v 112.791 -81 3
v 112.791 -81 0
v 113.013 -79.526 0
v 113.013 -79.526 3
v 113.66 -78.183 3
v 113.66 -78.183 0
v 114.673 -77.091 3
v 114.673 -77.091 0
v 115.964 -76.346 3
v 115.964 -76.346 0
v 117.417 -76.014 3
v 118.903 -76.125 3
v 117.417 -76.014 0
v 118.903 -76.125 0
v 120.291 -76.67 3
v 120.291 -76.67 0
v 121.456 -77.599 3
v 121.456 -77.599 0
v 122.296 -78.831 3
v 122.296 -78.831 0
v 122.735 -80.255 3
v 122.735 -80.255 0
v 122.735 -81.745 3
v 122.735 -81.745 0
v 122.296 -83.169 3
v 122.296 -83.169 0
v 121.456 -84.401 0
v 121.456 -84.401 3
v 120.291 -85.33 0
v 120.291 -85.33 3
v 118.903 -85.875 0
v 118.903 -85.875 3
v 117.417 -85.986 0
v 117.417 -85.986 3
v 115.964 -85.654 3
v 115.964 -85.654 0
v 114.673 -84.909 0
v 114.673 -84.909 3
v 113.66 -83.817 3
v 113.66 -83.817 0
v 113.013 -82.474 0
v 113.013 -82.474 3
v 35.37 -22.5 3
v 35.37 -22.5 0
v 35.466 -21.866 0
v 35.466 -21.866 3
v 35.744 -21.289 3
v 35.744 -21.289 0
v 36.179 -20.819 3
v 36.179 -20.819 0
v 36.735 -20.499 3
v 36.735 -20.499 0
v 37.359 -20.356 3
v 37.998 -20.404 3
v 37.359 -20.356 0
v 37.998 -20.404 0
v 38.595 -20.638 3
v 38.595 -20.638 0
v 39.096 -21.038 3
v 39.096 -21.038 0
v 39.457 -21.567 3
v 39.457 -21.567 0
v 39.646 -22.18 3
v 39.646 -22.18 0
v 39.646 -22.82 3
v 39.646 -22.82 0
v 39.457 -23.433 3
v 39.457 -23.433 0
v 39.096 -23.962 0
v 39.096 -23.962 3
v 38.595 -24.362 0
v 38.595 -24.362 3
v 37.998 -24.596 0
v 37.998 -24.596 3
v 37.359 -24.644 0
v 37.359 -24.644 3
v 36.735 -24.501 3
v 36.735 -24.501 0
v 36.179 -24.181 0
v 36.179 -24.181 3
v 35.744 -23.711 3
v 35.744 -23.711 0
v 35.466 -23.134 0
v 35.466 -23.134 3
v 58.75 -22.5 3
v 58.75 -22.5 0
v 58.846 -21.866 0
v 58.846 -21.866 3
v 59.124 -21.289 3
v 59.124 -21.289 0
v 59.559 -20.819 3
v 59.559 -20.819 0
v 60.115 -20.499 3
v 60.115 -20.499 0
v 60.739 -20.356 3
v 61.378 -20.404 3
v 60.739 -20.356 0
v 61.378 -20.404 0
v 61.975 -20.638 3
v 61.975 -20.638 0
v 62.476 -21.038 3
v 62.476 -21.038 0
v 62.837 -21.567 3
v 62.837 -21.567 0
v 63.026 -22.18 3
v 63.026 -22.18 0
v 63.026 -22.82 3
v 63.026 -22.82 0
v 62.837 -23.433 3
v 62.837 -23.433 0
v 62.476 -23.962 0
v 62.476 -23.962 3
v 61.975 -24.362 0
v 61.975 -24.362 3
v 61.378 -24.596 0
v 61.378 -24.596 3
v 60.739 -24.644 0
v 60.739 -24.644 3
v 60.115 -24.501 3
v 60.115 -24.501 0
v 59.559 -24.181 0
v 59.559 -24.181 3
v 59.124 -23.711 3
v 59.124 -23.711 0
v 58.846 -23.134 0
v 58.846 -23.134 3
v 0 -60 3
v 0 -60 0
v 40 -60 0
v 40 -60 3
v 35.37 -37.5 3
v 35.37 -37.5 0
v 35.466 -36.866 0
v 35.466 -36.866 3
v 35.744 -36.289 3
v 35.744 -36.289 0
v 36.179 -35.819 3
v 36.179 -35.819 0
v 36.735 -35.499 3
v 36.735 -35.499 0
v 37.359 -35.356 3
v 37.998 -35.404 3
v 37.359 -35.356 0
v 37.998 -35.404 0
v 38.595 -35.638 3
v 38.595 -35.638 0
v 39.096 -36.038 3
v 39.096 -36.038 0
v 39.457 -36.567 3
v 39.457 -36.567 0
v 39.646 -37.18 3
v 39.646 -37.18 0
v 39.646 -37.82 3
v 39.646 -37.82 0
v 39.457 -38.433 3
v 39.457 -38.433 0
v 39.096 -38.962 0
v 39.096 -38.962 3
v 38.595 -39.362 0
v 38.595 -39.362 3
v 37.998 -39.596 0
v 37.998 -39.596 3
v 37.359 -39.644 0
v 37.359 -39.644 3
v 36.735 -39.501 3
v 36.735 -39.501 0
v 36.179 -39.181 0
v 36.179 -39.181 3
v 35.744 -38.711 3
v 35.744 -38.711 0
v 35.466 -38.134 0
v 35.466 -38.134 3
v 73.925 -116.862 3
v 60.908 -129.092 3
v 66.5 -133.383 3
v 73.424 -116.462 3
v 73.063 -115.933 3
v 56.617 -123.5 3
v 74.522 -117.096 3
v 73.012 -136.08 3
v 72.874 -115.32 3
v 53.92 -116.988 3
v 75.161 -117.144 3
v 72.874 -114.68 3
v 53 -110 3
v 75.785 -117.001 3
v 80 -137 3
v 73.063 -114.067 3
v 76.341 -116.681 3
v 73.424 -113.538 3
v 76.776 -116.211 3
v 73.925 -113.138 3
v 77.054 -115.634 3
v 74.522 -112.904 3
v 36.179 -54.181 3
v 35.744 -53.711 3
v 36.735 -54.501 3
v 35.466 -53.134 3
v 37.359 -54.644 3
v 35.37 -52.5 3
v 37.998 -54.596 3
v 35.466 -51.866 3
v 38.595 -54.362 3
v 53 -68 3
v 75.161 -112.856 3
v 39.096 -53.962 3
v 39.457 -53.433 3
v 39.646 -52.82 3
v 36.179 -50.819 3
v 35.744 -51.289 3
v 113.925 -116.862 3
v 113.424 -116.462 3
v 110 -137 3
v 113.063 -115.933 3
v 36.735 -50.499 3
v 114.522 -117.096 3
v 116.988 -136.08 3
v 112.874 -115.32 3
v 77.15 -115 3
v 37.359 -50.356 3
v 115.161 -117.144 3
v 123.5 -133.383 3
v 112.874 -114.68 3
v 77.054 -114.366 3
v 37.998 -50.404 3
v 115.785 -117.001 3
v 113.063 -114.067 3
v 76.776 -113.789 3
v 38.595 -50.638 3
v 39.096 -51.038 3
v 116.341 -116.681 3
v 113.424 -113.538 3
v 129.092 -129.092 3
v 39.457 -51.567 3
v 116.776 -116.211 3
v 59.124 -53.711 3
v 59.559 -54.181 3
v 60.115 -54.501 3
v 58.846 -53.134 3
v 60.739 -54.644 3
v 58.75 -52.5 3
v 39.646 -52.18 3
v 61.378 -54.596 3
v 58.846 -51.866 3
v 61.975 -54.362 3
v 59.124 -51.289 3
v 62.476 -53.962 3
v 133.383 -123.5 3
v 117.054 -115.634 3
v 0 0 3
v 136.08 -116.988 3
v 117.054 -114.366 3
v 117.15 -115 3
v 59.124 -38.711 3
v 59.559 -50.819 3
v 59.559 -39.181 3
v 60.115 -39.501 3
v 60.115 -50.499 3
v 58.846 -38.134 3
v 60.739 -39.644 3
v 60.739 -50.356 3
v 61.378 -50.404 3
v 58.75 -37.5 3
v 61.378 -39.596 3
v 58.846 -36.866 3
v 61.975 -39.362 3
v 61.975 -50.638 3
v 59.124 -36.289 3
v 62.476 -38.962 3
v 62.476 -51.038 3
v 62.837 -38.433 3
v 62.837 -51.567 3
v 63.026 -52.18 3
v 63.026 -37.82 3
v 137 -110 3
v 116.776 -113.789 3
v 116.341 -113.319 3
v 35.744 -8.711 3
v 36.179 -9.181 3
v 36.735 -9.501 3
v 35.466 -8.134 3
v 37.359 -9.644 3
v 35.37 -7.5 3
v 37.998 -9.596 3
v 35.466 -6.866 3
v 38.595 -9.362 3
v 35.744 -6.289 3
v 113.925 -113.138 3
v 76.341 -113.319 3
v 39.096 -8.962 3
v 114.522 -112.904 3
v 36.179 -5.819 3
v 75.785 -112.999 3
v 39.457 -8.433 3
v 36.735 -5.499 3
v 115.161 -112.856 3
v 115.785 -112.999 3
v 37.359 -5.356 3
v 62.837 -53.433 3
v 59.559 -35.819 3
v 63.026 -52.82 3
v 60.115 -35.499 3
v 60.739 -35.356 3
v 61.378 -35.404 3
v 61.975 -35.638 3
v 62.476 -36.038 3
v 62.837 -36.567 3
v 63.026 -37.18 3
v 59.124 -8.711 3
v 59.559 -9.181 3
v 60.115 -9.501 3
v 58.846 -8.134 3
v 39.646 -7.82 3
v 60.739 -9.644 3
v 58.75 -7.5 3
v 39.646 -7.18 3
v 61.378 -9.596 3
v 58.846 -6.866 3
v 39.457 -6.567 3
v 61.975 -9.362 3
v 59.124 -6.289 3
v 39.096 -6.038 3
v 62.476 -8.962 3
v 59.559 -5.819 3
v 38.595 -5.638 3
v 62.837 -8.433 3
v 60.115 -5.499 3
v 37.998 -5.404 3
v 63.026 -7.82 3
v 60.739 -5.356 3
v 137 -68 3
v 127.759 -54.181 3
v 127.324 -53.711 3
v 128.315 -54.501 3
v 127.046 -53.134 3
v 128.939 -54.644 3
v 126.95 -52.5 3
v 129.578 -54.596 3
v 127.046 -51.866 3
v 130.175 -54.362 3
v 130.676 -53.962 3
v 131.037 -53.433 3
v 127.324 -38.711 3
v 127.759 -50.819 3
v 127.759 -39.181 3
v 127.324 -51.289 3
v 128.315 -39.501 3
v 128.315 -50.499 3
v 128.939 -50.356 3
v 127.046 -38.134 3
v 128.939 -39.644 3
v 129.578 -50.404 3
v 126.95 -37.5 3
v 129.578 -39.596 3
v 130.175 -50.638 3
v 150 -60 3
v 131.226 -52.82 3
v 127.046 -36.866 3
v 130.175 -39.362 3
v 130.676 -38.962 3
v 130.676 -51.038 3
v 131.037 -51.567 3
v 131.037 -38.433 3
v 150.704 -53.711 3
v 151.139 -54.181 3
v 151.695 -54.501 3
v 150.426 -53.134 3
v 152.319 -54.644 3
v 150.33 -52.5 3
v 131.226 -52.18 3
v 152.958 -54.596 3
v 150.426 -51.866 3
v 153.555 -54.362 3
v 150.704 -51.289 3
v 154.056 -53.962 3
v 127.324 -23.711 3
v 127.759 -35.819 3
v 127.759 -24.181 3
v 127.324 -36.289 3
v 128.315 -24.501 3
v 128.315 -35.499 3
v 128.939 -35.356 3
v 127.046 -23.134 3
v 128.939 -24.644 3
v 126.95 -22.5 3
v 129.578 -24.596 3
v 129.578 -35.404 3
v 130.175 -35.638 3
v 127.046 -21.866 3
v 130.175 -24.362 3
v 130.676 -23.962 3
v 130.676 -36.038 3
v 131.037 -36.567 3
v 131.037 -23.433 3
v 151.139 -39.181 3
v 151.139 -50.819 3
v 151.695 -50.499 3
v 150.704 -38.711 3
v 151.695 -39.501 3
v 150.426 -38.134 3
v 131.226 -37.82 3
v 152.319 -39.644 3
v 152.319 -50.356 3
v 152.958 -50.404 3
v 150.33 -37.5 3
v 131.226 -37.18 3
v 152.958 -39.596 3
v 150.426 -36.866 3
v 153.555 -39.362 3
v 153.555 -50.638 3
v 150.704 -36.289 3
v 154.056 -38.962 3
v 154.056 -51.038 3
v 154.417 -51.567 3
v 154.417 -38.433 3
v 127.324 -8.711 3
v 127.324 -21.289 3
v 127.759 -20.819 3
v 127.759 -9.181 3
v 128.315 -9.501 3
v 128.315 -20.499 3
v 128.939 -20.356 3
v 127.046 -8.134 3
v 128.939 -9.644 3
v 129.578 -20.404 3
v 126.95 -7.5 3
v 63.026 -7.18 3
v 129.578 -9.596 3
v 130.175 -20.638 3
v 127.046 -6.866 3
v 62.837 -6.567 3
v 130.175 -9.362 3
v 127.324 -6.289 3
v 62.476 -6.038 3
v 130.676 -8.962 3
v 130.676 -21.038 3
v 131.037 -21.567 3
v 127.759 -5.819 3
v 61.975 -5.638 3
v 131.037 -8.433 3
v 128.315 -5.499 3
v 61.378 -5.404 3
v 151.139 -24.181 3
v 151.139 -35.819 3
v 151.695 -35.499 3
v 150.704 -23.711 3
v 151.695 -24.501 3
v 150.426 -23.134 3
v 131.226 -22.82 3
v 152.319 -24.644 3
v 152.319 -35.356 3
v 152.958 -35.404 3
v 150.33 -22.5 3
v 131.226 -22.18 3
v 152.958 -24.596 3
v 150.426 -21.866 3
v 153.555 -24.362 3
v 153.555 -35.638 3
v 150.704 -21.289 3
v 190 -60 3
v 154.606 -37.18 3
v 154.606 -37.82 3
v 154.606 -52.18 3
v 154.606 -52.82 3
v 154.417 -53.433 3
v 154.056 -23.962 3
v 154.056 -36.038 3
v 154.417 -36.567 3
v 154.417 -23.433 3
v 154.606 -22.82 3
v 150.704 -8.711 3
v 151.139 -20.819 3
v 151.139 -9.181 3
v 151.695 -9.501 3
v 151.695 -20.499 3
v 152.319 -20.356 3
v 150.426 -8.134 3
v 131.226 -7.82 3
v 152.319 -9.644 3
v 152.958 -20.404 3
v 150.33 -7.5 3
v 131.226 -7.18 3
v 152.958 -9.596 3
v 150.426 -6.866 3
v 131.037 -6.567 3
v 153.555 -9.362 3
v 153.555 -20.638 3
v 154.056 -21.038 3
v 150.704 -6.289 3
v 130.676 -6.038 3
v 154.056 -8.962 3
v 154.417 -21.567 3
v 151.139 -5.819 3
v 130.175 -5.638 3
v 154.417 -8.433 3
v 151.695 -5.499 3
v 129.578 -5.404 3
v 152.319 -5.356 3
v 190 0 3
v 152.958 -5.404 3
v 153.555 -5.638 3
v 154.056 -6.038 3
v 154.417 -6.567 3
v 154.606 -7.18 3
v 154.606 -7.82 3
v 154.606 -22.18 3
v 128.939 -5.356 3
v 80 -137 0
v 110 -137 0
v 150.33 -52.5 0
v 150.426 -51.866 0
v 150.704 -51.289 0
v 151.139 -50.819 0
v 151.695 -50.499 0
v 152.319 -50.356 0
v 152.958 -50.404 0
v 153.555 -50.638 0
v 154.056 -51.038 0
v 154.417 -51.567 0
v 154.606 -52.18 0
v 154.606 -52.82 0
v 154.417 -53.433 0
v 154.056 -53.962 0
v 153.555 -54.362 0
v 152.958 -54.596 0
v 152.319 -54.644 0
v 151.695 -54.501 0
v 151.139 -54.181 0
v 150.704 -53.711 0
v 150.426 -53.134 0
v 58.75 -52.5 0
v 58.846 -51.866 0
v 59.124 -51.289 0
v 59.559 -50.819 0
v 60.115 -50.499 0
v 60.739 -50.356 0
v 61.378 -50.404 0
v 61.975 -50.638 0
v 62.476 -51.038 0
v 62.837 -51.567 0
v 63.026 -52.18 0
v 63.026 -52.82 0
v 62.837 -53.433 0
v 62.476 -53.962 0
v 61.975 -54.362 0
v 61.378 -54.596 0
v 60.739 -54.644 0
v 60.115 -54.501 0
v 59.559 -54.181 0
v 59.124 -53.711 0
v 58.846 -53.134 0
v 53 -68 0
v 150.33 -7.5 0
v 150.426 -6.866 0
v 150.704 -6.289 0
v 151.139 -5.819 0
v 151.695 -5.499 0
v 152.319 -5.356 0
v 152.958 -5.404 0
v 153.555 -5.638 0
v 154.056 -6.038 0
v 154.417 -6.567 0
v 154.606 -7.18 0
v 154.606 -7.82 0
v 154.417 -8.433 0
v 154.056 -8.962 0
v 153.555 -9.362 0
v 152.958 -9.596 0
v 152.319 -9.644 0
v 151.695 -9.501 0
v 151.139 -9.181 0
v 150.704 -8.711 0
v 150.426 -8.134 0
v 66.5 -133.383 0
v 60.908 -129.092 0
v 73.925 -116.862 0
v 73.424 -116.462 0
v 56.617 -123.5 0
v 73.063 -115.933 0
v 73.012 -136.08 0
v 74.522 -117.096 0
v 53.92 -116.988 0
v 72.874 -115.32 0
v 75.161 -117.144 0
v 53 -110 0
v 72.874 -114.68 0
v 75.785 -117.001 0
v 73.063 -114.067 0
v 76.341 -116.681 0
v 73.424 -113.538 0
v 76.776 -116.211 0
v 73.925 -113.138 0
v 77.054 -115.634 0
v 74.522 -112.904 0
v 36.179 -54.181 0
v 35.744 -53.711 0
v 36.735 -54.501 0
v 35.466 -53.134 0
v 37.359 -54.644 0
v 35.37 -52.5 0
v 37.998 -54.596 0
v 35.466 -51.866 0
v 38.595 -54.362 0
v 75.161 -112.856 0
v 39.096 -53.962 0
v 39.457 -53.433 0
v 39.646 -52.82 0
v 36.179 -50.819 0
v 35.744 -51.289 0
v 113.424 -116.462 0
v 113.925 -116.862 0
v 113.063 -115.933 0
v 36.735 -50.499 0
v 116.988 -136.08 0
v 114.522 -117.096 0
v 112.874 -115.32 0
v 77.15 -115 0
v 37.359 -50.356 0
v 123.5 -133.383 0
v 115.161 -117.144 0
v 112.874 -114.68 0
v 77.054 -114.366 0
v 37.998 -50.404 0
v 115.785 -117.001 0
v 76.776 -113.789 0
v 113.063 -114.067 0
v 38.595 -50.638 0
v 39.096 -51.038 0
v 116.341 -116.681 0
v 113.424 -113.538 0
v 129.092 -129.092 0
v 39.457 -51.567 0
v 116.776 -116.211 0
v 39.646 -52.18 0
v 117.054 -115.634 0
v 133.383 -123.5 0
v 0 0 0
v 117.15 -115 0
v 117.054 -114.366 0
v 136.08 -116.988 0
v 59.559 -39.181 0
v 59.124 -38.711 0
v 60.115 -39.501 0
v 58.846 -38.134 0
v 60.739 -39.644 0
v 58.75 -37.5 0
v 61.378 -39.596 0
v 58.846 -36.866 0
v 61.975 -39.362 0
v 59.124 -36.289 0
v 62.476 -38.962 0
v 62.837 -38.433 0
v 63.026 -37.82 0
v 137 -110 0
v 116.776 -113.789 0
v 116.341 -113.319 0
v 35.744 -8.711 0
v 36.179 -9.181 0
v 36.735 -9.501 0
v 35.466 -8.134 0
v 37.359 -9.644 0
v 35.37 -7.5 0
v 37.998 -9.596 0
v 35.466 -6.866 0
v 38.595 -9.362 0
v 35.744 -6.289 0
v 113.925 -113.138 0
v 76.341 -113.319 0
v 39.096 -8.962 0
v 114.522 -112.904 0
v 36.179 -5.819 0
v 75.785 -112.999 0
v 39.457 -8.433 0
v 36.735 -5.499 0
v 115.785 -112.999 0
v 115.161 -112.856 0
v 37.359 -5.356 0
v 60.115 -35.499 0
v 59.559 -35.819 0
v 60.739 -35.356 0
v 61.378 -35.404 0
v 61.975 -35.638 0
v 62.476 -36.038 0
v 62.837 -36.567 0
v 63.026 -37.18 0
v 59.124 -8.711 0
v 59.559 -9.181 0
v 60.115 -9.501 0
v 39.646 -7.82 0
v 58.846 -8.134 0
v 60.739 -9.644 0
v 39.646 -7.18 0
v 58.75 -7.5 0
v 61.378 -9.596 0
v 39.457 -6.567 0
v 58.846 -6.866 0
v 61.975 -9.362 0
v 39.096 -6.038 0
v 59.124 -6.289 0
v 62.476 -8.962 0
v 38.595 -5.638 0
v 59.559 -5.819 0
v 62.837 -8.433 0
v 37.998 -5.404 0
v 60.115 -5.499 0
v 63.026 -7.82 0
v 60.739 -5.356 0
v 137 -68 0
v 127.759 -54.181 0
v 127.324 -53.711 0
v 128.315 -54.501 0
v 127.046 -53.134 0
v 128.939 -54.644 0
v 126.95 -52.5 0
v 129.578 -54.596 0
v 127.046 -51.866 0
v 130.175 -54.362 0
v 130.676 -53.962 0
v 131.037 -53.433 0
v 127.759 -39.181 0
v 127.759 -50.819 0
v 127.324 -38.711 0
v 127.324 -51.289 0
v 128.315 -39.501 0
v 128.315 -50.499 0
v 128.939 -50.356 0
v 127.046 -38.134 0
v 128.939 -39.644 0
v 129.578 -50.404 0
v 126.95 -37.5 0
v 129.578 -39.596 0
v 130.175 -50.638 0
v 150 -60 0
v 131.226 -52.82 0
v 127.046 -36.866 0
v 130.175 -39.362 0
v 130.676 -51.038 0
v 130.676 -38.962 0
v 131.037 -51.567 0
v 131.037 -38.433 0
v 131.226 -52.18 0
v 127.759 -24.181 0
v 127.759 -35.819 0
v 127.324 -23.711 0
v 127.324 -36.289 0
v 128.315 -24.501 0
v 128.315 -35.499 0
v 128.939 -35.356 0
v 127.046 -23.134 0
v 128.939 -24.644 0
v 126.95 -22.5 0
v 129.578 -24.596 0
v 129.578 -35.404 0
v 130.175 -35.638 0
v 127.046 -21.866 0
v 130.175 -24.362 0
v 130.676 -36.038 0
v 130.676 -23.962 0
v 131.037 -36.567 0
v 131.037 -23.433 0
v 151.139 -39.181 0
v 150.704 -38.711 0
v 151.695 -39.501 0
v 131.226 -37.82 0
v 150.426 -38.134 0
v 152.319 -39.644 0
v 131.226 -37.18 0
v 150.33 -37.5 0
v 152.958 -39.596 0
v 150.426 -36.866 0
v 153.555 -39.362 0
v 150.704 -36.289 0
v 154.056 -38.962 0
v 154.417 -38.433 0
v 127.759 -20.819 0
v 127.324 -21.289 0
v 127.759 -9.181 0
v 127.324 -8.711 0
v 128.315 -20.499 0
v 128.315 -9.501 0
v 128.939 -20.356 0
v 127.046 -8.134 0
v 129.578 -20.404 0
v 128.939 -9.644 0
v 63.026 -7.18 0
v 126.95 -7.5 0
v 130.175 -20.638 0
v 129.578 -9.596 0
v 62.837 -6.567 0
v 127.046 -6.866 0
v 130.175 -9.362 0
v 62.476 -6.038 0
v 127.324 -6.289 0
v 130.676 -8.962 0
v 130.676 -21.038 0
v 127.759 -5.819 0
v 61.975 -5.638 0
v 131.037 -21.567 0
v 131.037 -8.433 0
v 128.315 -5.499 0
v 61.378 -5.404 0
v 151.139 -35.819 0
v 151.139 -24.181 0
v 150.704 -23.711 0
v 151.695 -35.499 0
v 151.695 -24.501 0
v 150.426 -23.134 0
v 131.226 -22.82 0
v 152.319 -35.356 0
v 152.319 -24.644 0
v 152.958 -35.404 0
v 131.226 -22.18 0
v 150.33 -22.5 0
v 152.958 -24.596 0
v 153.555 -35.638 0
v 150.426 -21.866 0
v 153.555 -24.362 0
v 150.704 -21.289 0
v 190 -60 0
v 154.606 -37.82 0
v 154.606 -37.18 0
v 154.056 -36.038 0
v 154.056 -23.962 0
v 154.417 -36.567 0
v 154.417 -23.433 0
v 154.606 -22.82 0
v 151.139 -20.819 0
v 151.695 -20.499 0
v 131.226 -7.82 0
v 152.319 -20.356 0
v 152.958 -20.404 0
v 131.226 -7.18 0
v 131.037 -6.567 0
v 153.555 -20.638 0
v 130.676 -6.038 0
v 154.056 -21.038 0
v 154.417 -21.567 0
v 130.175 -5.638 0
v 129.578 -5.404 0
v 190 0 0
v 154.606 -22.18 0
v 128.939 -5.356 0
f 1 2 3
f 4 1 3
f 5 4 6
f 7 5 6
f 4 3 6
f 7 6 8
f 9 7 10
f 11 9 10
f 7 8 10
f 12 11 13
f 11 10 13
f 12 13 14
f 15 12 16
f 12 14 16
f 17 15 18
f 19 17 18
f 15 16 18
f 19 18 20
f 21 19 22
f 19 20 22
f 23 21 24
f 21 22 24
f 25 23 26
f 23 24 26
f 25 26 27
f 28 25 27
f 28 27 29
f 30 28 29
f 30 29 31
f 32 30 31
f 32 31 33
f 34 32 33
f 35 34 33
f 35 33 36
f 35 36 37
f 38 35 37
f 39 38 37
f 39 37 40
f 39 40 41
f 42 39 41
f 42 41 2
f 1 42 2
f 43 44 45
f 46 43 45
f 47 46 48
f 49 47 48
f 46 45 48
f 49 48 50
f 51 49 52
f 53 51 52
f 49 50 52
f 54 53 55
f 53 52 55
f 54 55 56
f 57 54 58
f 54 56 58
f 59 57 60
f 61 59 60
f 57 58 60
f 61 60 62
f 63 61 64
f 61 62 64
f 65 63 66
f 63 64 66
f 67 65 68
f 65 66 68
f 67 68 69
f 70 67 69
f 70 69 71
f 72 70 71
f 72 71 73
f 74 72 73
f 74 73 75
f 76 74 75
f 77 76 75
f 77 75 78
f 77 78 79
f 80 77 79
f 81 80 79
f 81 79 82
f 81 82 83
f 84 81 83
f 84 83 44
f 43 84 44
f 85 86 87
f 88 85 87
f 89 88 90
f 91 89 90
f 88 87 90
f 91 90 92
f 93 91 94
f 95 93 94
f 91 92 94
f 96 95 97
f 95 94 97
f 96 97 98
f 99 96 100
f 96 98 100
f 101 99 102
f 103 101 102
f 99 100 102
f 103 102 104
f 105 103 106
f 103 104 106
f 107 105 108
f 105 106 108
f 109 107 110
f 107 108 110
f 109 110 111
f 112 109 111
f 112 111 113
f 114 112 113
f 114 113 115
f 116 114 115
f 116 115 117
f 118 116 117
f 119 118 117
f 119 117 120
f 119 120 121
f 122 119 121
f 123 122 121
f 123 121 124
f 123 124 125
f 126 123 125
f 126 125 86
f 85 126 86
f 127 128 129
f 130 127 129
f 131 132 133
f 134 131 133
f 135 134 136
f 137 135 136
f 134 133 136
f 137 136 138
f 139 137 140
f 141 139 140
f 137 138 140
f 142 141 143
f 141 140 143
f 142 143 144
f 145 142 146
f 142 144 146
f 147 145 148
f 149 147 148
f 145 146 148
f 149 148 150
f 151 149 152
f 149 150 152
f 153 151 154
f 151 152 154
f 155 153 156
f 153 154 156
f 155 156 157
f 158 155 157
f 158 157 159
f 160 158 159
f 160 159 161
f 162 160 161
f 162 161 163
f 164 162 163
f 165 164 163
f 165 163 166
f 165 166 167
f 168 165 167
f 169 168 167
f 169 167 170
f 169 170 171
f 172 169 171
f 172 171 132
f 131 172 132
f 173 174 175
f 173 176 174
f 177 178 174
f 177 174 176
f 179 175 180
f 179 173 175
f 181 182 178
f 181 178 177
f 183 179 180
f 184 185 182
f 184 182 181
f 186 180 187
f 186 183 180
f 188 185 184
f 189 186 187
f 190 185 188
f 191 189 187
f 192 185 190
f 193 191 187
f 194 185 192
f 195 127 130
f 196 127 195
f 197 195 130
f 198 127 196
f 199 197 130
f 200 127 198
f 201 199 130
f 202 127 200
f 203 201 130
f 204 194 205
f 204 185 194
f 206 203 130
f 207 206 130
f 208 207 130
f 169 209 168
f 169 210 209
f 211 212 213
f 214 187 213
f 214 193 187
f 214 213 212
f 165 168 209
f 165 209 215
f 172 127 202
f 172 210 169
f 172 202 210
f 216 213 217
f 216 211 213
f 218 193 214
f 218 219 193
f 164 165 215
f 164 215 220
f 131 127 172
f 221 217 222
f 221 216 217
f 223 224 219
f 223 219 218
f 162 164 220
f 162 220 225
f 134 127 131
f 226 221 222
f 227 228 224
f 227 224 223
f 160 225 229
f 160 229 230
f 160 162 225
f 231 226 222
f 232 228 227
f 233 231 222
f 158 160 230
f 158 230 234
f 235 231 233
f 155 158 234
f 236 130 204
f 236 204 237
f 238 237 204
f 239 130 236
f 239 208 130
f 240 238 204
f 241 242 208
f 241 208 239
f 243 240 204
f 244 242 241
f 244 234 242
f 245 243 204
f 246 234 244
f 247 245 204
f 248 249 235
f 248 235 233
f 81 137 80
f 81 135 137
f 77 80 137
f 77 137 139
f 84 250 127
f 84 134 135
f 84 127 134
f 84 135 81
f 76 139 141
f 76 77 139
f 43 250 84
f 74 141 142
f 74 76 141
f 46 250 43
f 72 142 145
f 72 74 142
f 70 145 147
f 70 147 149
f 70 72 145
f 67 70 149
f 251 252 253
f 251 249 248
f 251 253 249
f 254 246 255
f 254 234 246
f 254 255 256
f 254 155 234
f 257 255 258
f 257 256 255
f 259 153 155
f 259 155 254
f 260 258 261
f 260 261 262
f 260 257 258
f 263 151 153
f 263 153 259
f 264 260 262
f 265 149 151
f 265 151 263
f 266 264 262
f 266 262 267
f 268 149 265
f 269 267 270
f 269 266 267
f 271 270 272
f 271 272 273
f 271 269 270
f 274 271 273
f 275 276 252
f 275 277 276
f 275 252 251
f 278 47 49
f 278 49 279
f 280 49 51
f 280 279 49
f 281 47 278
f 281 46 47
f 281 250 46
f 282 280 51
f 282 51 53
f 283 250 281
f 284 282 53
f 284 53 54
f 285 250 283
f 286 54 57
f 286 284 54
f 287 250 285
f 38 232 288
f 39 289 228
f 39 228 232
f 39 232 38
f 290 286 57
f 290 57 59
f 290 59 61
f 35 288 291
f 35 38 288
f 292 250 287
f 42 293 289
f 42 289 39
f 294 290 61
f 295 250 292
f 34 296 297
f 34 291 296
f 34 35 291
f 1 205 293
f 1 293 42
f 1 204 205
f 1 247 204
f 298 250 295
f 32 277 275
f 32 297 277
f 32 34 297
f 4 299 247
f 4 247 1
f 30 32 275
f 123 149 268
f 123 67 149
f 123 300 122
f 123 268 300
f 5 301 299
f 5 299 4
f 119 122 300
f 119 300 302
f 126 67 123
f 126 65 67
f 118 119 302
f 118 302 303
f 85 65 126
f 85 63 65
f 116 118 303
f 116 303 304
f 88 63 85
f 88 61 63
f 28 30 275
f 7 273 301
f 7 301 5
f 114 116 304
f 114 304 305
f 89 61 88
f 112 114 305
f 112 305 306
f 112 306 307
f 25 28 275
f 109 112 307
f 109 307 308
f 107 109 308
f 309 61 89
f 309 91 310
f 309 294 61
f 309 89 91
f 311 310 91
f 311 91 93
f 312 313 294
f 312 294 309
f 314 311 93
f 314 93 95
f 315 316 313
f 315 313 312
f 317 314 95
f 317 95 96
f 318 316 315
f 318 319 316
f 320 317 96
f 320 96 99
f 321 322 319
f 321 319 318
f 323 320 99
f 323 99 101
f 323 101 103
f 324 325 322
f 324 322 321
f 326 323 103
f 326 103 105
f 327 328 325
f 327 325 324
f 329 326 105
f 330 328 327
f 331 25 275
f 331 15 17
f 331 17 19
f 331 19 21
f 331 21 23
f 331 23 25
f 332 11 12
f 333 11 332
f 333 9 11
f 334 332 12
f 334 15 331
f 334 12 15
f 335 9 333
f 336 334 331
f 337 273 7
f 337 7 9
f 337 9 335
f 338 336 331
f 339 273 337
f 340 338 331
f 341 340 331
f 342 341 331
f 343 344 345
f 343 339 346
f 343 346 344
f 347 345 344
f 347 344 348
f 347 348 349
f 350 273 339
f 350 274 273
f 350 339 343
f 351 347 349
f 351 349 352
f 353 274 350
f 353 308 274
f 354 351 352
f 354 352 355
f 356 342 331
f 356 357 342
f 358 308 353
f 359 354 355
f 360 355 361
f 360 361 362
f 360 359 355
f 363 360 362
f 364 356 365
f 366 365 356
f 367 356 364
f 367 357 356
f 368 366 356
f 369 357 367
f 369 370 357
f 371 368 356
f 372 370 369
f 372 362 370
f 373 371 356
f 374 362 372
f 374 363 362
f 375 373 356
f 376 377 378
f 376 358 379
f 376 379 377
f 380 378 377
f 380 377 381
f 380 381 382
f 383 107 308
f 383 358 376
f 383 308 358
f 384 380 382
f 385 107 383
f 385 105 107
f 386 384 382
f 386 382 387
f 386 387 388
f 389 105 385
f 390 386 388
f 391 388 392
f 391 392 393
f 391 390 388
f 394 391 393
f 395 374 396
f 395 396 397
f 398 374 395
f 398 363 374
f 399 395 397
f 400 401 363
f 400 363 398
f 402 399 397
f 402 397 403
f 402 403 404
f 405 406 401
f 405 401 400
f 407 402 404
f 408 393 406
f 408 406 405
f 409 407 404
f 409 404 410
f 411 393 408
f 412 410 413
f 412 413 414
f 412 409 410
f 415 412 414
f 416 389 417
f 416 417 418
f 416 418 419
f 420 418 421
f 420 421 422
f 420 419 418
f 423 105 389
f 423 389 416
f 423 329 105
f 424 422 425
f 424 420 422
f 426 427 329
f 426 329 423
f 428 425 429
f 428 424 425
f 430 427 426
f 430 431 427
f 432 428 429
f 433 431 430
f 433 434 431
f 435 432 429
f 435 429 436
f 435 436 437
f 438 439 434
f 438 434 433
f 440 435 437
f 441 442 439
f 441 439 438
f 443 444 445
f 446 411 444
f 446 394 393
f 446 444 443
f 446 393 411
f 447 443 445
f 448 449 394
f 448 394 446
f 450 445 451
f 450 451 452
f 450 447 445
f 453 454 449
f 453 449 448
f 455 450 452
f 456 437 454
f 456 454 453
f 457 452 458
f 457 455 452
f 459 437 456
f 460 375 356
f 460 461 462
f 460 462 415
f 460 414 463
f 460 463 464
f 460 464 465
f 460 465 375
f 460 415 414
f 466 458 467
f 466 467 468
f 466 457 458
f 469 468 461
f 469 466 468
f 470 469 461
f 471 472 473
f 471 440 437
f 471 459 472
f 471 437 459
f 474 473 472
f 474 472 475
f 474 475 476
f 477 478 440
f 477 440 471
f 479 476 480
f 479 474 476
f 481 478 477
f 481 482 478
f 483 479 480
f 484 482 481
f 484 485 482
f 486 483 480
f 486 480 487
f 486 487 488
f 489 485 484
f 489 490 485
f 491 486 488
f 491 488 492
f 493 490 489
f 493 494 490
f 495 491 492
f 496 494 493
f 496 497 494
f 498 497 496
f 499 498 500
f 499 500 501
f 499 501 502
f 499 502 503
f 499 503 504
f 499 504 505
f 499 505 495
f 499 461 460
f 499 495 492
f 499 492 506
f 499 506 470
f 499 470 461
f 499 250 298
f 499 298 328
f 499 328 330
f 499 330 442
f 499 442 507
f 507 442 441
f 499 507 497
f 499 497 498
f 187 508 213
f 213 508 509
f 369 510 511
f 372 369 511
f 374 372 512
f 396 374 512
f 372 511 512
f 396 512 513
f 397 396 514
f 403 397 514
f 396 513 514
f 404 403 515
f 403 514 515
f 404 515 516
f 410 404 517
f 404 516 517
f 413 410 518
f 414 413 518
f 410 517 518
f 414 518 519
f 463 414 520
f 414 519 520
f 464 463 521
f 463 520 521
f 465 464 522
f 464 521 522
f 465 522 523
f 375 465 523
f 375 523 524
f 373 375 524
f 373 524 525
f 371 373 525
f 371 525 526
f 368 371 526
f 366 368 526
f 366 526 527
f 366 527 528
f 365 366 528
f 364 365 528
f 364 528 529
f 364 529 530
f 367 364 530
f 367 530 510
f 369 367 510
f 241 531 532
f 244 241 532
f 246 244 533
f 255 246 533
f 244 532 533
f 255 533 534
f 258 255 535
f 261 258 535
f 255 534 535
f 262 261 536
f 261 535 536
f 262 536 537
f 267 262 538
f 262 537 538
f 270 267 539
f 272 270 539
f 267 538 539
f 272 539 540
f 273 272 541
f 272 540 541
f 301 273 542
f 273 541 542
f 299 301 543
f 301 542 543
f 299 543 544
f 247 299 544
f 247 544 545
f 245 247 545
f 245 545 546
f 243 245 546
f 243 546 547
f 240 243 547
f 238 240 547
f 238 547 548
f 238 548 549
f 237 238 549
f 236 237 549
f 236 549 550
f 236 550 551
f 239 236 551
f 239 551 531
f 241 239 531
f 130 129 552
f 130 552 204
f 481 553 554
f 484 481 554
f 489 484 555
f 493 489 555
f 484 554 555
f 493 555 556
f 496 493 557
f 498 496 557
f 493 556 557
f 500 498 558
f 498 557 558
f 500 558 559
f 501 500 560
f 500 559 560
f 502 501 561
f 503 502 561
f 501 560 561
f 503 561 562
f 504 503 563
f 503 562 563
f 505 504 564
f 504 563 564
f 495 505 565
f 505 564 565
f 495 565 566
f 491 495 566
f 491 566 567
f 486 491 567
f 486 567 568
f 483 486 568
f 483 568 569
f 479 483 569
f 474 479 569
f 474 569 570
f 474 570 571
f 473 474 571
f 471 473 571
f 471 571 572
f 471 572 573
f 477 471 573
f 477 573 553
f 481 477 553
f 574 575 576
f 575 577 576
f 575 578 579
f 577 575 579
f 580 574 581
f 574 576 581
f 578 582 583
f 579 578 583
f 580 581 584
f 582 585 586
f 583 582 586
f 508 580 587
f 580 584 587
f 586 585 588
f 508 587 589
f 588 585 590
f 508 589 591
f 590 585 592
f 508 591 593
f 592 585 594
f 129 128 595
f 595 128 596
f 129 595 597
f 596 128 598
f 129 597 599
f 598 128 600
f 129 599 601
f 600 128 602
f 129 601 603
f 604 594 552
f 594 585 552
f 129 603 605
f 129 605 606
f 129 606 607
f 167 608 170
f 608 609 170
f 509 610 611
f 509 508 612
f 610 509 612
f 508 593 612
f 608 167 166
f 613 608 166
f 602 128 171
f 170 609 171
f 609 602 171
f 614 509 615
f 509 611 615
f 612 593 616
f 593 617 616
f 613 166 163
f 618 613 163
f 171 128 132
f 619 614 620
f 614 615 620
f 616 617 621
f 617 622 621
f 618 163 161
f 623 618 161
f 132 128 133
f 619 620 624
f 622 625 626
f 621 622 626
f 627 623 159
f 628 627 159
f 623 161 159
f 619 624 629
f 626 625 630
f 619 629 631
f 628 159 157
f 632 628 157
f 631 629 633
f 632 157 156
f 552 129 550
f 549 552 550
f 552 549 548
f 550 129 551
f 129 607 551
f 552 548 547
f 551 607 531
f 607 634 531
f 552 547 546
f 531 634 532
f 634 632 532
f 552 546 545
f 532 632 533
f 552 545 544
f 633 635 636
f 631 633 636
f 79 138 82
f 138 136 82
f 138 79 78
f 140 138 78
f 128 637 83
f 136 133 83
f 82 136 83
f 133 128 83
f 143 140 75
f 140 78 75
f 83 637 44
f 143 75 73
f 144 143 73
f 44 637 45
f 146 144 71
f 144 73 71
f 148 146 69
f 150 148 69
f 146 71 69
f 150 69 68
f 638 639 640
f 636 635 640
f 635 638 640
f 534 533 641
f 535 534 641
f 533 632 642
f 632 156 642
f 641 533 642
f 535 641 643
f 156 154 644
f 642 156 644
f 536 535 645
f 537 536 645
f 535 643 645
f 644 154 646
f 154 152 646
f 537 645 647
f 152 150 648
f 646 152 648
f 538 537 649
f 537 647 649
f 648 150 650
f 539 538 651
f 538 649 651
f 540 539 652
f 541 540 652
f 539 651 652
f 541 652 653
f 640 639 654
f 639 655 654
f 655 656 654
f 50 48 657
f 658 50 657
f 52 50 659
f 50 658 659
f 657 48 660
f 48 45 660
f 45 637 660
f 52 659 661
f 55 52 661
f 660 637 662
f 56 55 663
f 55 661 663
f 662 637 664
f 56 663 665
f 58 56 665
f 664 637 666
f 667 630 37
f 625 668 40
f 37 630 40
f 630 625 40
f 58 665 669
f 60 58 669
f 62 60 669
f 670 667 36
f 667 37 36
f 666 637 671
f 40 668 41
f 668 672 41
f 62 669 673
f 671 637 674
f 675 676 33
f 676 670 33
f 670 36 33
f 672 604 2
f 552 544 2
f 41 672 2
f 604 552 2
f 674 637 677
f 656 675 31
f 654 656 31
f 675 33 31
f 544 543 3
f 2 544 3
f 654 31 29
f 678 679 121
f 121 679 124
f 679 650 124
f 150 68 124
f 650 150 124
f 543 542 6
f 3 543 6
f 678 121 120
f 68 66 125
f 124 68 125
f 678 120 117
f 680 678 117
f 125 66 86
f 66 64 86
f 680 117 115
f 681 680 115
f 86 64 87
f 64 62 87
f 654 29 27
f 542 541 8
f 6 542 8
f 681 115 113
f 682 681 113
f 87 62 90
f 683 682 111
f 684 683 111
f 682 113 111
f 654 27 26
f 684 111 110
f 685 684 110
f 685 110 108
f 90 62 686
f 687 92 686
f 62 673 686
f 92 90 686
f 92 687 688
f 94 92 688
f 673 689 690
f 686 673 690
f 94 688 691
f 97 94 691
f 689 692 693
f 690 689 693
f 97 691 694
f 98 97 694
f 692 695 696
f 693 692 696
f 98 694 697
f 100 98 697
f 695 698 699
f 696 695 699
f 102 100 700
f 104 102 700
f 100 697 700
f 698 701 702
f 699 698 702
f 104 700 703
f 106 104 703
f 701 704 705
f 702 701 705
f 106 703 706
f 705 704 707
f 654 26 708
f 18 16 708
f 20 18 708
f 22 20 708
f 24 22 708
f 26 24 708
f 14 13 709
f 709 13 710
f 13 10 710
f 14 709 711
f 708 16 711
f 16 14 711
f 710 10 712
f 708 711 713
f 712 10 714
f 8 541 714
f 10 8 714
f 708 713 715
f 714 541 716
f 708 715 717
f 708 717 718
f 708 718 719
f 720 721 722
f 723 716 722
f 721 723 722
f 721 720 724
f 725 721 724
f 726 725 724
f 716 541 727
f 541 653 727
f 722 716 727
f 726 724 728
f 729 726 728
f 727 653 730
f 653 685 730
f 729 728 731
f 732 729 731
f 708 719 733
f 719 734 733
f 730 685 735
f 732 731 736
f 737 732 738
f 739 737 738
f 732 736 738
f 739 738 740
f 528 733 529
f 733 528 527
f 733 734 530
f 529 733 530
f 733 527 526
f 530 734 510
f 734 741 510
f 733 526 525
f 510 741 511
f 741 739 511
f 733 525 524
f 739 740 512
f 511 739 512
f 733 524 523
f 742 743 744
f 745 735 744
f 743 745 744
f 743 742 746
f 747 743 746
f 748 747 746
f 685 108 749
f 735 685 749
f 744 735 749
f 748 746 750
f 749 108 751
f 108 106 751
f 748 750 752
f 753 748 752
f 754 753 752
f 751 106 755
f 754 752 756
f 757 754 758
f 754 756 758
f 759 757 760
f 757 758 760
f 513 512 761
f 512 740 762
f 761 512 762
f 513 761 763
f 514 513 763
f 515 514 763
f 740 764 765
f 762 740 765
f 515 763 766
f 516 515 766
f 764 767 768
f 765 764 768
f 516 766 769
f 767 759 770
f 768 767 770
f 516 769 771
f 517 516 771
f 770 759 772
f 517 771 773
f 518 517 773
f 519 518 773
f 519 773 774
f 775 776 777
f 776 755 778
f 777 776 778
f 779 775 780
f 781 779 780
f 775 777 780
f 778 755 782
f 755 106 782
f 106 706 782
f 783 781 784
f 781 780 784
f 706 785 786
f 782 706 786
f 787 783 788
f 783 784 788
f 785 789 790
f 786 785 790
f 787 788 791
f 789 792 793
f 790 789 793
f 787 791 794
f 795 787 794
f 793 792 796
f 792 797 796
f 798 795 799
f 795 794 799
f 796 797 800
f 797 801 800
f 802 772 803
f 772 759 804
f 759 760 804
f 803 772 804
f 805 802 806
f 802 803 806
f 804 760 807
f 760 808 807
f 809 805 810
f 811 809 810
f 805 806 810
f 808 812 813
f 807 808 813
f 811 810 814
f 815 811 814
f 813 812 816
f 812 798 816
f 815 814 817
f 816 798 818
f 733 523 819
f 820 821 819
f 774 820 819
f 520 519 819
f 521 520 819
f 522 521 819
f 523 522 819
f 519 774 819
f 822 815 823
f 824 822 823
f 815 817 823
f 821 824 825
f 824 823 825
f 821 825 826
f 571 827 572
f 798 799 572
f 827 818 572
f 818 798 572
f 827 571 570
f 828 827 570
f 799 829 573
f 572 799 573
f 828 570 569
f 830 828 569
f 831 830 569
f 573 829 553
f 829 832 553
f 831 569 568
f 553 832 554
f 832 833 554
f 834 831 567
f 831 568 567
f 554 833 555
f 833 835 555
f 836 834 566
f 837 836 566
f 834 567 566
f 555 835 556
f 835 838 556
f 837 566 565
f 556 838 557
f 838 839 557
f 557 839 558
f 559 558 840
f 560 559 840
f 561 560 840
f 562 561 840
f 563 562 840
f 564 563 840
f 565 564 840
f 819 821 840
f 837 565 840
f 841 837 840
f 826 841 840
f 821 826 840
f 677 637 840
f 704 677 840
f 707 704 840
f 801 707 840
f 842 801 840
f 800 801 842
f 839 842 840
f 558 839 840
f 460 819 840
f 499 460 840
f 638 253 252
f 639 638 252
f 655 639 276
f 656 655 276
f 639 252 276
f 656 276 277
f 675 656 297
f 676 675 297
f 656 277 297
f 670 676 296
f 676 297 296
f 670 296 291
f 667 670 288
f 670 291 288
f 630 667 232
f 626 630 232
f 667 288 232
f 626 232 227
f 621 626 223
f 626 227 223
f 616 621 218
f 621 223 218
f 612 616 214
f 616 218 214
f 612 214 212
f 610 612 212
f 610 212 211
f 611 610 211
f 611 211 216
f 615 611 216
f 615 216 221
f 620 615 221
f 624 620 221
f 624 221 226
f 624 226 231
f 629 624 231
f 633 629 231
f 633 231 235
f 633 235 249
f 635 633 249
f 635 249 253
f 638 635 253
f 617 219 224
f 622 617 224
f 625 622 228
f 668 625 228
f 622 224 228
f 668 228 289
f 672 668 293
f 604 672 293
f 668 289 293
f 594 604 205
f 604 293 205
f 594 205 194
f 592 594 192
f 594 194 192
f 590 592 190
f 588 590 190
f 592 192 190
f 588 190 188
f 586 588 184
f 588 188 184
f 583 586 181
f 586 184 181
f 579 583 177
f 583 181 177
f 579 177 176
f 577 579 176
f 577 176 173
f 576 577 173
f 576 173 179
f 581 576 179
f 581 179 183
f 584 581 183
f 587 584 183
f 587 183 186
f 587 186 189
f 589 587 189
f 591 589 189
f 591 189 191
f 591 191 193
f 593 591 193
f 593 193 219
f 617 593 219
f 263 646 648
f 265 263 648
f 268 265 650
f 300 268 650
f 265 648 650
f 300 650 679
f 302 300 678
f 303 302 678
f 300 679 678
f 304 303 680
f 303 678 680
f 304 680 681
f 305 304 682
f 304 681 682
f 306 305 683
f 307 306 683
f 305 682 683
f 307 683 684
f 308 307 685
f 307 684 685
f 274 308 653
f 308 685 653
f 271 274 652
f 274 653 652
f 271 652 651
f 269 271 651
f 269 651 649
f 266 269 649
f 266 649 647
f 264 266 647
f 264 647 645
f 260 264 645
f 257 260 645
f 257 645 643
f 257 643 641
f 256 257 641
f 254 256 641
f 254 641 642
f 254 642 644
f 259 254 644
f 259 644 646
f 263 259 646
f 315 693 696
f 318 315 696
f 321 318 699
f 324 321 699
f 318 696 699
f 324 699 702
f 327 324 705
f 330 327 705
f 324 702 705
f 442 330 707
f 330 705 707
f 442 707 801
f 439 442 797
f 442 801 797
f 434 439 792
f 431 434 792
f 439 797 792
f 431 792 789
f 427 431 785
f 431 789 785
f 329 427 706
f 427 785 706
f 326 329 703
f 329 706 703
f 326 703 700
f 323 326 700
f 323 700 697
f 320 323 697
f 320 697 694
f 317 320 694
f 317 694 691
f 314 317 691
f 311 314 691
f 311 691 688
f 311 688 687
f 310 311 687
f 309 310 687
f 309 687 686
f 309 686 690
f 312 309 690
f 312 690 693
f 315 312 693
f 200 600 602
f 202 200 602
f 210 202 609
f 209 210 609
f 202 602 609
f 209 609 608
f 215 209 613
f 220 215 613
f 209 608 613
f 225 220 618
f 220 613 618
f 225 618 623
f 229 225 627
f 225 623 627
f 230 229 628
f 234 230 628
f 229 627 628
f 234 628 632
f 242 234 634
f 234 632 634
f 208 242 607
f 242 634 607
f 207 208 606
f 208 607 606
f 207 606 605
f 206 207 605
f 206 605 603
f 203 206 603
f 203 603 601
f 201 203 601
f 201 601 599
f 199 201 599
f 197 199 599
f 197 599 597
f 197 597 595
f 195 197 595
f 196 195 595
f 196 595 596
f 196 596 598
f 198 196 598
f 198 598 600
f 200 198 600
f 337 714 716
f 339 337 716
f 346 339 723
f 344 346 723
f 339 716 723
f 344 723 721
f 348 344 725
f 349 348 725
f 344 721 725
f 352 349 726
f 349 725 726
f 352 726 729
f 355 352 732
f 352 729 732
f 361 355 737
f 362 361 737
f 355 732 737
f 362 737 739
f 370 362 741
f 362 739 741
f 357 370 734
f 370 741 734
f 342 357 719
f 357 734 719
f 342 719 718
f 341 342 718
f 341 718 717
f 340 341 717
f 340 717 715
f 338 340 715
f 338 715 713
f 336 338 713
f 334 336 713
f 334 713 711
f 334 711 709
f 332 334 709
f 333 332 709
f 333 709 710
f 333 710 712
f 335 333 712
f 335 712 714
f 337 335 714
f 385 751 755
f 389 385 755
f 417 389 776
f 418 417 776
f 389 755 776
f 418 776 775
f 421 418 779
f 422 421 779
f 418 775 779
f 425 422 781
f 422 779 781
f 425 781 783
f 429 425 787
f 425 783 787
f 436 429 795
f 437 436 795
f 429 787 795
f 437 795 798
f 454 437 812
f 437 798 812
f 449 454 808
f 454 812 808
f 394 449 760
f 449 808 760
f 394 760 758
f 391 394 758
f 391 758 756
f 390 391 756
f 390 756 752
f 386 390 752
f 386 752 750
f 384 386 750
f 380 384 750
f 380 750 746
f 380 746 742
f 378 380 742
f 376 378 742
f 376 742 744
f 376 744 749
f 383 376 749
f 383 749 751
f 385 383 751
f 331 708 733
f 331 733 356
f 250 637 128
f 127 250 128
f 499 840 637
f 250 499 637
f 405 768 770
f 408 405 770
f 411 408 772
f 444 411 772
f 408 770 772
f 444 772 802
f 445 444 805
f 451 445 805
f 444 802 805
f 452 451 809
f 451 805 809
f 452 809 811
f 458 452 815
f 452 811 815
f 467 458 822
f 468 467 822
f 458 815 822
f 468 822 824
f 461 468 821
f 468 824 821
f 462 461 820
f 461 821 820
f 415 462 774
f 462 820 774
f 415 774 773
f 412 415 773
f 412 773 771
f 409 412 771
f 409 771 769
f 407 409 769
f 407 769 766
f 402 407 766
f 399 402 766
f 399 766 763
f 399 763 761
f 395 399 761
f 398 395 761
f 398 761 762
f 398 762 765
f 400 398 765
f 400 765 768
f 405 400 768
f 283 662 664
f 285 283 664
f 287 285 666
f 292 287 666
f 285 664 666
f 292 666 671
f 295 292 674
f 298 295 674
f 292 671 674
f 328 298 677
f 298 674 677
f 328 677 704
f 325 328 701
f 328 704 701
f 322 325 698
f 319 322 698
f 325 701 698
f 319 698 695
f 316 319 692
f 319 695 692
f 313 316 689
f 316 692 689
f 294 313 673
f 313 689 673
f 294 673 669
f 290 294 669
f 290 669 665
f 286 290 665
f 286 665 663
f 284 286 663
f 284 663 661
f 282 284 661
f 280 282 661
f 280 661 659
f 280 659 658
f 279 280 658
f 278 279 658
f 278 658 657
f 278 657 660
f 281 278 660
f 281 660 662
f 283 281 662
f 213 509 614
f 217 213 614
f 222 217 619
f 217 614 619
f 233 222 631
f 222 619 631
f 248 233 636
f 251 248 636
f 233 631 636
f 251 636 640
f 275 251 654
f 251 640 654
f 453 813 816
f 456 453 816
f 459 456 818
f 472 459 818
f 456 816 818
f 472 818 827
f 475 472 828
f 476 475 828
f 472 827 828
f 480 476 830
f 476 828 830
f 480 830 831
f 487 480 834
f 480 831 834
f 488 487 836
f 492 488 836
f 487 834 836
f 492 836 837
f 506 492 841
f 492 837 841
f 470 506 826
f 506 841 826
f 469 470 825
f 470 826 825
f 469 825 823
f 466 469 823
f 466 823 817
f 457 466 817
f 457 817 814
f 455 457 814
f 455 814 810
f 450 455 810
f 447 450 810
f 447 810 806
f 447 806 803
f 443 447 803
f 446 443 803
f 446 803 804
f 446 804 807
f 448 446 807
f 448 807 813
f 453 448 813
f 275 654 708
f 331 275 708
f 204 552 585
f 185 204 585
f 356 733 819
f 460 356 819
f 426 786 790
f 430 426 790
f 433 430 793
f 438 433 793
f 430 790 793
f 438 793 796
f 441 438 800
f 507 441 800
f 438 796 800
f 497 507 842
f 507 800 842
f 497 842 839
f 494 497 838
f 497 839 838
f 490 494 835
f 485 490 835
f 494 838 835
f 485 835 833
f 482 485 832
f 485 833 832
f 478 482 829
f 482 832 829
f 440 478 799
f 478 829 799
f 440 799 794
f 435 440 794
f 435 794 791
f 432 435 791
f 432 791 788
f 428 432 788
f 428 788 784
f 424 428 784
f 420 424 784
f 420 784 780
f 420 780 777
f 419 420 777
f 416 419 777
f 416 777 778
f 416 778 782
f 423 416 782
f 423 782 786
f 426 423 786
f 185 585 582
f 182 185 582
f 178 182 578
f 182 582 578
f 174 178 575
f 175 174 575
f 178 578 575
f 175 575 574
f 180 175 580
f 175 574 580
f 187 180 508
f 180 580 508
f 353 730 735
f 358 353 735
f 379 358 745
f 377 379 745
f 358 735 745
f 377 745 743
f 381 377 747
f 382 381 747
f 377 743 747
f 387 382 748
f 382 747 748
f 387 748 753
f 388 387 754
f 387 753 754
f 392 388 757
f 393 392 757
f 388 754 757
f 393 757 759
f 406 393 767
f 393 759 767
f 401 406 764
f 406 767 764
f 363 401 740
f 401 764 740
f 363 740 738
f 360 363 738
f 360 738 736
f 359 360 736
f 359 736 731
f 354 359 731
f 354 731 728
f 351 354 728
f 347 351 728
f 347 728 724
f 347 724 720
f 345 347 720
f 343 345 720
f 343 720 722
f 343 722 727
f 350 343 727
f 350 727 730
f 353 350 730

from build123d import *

# Parameters (mm, degrees)
EXTRUDE_1_DEPTH     = 3
CUT_EXTRUDE_1_REACH = 236.261
SKETCH_2_R          = 2.15
CHAMFER_1_SIZE      = 13
CHAMFER_1_SIZE2     = 8
CHAMFER_2_SIZE      = 8
CHAMFER_2_SIZE2     = 13
SKETCH_6_R          = 5
CUT_EXTRUDE_4_DEPTH = 10
SKETCH_7_R          = 2.15
CUT_EXTRUDE_5_DEPTH = 235.260538717


with BuildPart() as part:
    # 草图1 → 凸台-拉伸1 (new body)
    with BuildSketch(Plane.XY):
        with BuildLine():
            Line((0, 0), (0, -60))
            Line((0, -60), (53, -60))
            Line((53, -60), (53, -110))
            ThreePointArc((53, -110), (60.908116908, -129.091883092), (80, -137))
            Line((80, -137), (110, -137))
            ThreePointArc((110, -137), (129.091883092, -129.091883092), (137, -110))
            Line((137, -110), (137, -60))
            Line((137, -60), (190, -60))
            Line((190, -60), (190, 0))
            Line((190, 0), (0, 0))
        make_face()
    extrude(amount=EXTRUDE_1_DEPTH)

    # 草图2 → 切除-拉伸1 (cut, up to next)
    with BuildSketch(Plane.XY.offset(3), mode=Mode.PRIVATE) as cut_extrude_1_sk1:
        with Locations((75, -115)):
            Circle(SKETCH_2_R)
    cut_extrude_1_tool1 = extrude(cut_extrude_1_sk1.sketch, amount=-CUT_EXTRUDE_1_REACH, mode=Mode.PRIVATE) & part.part
    # 草图2 → 切除-拉伸1 (cut, up to next)
    with BuildSketch(Plane.XY.offset(3), mode=Mode.PRIVATE) as cut_extrude_1_sk2:
        with Locations((115, -115)):
            Circle(SKETCH_2_R)
    cut_extrude_1_tool2 = extrude(cut_extrude_1_sk2.sketch, amount=-CUT_EXTRUDE_1_REACH, mode=Mode.PRIVATE) & part.part
    add(cut_extrude_1_tool1.solids().sort_by_distance((75, -115, 3))[0], mode=Mode.SUBTRACT)
    add(cut_extrude_1_tool2.solids().sort_by_distance((115, -115, 3))[0], mode=Mode.SUBTRACT)

    # 倒角1
    chamfer_1_edges = [part.edges().sort_by_distance(p)[0] for p in [
        (53, -60, 1.5),
    ]]
    chamfer_1_side = [part.faces().sort_by_distance(p)[0] for p in [
        (26.5, -60, 1.5),
    ]]
    chamfer(chamfer_1_edges, length=CHAMFER_1_SIZE, length2=CHAMFER_1_SIZE2, reference=chamfer_1_side[0])

    # 倒角2
    chamfer_2_edges = [part.edges().sort_by_distance(p)[0] for p in [
        (137, -60, 1.5),
    ]]
    chamfer_2_side = [part.faces().sort_by_distance(p)[0] for p in [
        (137, -85, 1.5),
    ]]
    chamfer(chamfer_2_edges, length=CHAMFER_2_SIZE, length2=CHAMFER_2_SIZE2, reference=chamfer_2_side[0])

    # 草图6 → 切除-拉伸4 (cut)
    with BuildSketch(Plane(origin=(0, 0, 0), x_dir=(-1, 0, 0), z_dir=(0, 0, -1))):
        with Locations((-117.79084048, -81)):
            Circle(SKETCH_6_R)
    extrude(amount=-CUT_EXTRUDE_4_DEPTH, mode=Mode.SUBTRACT)

    # 草图7 → 切除-拉伸5 (cut, through all)
    with BuildSketch(Plane(origin=(0, 0, 0), x_dir=(-1, 0, 0), z_dir=(0, 0, -1))):
        with Locations((-129.1, -7.5)):
            Circle(SKETCH_7_R)
        with Locations((-152.48, -7.5)):
            Circle(SKETCH_7_R)
        with Locations((-152.48, -22.5)):
            Circle(SKETCH_7_R)
        with Locations((-129.1, -22.5)):
            Circle(SKETCH_7_R)
        with Locations((-152.48, -37.5)):
            Circle(SKETCH_7_R)
        with Locations((-129.1, -37.5)):
            Circle(SKETCH_7_R)
        with Locations((-152.48, -52.5)):
            Circle(SKETCH_7_R)
        with Locations((-129.1, -52.5)):
            Circle(SKETCH_7_R)
        with Locations((-60.9, -22.5)):
            Circle(SKETCH_7_R)
        with Locations((-37.52, -22.5)):
            Circle(SKETCH_7_R)
        with Locations((-60.9, -37.5)):
            Circle(SKETCH_7_R)
        with Locations((-37.52, -37.5)):
            Circle(SKETCH_7_R)
        with Locations((-60.9, -52.5)):
            Circle(SKETCH_7_R)
        with Locations((-37.52, -52.5)):
            Circle(SKETCH_7_R)
        with Locations((-60.9, -7.5)):
            Circle(SKETCH_7_R)
        with Locations((-37.52, -7.5)):
            Circle(SKETCH_7_R)
    extrude(amount=-CUT_EXTRUDE_5_DEPTH, mode=Mode.SUBTRACT)


solid = part.part
